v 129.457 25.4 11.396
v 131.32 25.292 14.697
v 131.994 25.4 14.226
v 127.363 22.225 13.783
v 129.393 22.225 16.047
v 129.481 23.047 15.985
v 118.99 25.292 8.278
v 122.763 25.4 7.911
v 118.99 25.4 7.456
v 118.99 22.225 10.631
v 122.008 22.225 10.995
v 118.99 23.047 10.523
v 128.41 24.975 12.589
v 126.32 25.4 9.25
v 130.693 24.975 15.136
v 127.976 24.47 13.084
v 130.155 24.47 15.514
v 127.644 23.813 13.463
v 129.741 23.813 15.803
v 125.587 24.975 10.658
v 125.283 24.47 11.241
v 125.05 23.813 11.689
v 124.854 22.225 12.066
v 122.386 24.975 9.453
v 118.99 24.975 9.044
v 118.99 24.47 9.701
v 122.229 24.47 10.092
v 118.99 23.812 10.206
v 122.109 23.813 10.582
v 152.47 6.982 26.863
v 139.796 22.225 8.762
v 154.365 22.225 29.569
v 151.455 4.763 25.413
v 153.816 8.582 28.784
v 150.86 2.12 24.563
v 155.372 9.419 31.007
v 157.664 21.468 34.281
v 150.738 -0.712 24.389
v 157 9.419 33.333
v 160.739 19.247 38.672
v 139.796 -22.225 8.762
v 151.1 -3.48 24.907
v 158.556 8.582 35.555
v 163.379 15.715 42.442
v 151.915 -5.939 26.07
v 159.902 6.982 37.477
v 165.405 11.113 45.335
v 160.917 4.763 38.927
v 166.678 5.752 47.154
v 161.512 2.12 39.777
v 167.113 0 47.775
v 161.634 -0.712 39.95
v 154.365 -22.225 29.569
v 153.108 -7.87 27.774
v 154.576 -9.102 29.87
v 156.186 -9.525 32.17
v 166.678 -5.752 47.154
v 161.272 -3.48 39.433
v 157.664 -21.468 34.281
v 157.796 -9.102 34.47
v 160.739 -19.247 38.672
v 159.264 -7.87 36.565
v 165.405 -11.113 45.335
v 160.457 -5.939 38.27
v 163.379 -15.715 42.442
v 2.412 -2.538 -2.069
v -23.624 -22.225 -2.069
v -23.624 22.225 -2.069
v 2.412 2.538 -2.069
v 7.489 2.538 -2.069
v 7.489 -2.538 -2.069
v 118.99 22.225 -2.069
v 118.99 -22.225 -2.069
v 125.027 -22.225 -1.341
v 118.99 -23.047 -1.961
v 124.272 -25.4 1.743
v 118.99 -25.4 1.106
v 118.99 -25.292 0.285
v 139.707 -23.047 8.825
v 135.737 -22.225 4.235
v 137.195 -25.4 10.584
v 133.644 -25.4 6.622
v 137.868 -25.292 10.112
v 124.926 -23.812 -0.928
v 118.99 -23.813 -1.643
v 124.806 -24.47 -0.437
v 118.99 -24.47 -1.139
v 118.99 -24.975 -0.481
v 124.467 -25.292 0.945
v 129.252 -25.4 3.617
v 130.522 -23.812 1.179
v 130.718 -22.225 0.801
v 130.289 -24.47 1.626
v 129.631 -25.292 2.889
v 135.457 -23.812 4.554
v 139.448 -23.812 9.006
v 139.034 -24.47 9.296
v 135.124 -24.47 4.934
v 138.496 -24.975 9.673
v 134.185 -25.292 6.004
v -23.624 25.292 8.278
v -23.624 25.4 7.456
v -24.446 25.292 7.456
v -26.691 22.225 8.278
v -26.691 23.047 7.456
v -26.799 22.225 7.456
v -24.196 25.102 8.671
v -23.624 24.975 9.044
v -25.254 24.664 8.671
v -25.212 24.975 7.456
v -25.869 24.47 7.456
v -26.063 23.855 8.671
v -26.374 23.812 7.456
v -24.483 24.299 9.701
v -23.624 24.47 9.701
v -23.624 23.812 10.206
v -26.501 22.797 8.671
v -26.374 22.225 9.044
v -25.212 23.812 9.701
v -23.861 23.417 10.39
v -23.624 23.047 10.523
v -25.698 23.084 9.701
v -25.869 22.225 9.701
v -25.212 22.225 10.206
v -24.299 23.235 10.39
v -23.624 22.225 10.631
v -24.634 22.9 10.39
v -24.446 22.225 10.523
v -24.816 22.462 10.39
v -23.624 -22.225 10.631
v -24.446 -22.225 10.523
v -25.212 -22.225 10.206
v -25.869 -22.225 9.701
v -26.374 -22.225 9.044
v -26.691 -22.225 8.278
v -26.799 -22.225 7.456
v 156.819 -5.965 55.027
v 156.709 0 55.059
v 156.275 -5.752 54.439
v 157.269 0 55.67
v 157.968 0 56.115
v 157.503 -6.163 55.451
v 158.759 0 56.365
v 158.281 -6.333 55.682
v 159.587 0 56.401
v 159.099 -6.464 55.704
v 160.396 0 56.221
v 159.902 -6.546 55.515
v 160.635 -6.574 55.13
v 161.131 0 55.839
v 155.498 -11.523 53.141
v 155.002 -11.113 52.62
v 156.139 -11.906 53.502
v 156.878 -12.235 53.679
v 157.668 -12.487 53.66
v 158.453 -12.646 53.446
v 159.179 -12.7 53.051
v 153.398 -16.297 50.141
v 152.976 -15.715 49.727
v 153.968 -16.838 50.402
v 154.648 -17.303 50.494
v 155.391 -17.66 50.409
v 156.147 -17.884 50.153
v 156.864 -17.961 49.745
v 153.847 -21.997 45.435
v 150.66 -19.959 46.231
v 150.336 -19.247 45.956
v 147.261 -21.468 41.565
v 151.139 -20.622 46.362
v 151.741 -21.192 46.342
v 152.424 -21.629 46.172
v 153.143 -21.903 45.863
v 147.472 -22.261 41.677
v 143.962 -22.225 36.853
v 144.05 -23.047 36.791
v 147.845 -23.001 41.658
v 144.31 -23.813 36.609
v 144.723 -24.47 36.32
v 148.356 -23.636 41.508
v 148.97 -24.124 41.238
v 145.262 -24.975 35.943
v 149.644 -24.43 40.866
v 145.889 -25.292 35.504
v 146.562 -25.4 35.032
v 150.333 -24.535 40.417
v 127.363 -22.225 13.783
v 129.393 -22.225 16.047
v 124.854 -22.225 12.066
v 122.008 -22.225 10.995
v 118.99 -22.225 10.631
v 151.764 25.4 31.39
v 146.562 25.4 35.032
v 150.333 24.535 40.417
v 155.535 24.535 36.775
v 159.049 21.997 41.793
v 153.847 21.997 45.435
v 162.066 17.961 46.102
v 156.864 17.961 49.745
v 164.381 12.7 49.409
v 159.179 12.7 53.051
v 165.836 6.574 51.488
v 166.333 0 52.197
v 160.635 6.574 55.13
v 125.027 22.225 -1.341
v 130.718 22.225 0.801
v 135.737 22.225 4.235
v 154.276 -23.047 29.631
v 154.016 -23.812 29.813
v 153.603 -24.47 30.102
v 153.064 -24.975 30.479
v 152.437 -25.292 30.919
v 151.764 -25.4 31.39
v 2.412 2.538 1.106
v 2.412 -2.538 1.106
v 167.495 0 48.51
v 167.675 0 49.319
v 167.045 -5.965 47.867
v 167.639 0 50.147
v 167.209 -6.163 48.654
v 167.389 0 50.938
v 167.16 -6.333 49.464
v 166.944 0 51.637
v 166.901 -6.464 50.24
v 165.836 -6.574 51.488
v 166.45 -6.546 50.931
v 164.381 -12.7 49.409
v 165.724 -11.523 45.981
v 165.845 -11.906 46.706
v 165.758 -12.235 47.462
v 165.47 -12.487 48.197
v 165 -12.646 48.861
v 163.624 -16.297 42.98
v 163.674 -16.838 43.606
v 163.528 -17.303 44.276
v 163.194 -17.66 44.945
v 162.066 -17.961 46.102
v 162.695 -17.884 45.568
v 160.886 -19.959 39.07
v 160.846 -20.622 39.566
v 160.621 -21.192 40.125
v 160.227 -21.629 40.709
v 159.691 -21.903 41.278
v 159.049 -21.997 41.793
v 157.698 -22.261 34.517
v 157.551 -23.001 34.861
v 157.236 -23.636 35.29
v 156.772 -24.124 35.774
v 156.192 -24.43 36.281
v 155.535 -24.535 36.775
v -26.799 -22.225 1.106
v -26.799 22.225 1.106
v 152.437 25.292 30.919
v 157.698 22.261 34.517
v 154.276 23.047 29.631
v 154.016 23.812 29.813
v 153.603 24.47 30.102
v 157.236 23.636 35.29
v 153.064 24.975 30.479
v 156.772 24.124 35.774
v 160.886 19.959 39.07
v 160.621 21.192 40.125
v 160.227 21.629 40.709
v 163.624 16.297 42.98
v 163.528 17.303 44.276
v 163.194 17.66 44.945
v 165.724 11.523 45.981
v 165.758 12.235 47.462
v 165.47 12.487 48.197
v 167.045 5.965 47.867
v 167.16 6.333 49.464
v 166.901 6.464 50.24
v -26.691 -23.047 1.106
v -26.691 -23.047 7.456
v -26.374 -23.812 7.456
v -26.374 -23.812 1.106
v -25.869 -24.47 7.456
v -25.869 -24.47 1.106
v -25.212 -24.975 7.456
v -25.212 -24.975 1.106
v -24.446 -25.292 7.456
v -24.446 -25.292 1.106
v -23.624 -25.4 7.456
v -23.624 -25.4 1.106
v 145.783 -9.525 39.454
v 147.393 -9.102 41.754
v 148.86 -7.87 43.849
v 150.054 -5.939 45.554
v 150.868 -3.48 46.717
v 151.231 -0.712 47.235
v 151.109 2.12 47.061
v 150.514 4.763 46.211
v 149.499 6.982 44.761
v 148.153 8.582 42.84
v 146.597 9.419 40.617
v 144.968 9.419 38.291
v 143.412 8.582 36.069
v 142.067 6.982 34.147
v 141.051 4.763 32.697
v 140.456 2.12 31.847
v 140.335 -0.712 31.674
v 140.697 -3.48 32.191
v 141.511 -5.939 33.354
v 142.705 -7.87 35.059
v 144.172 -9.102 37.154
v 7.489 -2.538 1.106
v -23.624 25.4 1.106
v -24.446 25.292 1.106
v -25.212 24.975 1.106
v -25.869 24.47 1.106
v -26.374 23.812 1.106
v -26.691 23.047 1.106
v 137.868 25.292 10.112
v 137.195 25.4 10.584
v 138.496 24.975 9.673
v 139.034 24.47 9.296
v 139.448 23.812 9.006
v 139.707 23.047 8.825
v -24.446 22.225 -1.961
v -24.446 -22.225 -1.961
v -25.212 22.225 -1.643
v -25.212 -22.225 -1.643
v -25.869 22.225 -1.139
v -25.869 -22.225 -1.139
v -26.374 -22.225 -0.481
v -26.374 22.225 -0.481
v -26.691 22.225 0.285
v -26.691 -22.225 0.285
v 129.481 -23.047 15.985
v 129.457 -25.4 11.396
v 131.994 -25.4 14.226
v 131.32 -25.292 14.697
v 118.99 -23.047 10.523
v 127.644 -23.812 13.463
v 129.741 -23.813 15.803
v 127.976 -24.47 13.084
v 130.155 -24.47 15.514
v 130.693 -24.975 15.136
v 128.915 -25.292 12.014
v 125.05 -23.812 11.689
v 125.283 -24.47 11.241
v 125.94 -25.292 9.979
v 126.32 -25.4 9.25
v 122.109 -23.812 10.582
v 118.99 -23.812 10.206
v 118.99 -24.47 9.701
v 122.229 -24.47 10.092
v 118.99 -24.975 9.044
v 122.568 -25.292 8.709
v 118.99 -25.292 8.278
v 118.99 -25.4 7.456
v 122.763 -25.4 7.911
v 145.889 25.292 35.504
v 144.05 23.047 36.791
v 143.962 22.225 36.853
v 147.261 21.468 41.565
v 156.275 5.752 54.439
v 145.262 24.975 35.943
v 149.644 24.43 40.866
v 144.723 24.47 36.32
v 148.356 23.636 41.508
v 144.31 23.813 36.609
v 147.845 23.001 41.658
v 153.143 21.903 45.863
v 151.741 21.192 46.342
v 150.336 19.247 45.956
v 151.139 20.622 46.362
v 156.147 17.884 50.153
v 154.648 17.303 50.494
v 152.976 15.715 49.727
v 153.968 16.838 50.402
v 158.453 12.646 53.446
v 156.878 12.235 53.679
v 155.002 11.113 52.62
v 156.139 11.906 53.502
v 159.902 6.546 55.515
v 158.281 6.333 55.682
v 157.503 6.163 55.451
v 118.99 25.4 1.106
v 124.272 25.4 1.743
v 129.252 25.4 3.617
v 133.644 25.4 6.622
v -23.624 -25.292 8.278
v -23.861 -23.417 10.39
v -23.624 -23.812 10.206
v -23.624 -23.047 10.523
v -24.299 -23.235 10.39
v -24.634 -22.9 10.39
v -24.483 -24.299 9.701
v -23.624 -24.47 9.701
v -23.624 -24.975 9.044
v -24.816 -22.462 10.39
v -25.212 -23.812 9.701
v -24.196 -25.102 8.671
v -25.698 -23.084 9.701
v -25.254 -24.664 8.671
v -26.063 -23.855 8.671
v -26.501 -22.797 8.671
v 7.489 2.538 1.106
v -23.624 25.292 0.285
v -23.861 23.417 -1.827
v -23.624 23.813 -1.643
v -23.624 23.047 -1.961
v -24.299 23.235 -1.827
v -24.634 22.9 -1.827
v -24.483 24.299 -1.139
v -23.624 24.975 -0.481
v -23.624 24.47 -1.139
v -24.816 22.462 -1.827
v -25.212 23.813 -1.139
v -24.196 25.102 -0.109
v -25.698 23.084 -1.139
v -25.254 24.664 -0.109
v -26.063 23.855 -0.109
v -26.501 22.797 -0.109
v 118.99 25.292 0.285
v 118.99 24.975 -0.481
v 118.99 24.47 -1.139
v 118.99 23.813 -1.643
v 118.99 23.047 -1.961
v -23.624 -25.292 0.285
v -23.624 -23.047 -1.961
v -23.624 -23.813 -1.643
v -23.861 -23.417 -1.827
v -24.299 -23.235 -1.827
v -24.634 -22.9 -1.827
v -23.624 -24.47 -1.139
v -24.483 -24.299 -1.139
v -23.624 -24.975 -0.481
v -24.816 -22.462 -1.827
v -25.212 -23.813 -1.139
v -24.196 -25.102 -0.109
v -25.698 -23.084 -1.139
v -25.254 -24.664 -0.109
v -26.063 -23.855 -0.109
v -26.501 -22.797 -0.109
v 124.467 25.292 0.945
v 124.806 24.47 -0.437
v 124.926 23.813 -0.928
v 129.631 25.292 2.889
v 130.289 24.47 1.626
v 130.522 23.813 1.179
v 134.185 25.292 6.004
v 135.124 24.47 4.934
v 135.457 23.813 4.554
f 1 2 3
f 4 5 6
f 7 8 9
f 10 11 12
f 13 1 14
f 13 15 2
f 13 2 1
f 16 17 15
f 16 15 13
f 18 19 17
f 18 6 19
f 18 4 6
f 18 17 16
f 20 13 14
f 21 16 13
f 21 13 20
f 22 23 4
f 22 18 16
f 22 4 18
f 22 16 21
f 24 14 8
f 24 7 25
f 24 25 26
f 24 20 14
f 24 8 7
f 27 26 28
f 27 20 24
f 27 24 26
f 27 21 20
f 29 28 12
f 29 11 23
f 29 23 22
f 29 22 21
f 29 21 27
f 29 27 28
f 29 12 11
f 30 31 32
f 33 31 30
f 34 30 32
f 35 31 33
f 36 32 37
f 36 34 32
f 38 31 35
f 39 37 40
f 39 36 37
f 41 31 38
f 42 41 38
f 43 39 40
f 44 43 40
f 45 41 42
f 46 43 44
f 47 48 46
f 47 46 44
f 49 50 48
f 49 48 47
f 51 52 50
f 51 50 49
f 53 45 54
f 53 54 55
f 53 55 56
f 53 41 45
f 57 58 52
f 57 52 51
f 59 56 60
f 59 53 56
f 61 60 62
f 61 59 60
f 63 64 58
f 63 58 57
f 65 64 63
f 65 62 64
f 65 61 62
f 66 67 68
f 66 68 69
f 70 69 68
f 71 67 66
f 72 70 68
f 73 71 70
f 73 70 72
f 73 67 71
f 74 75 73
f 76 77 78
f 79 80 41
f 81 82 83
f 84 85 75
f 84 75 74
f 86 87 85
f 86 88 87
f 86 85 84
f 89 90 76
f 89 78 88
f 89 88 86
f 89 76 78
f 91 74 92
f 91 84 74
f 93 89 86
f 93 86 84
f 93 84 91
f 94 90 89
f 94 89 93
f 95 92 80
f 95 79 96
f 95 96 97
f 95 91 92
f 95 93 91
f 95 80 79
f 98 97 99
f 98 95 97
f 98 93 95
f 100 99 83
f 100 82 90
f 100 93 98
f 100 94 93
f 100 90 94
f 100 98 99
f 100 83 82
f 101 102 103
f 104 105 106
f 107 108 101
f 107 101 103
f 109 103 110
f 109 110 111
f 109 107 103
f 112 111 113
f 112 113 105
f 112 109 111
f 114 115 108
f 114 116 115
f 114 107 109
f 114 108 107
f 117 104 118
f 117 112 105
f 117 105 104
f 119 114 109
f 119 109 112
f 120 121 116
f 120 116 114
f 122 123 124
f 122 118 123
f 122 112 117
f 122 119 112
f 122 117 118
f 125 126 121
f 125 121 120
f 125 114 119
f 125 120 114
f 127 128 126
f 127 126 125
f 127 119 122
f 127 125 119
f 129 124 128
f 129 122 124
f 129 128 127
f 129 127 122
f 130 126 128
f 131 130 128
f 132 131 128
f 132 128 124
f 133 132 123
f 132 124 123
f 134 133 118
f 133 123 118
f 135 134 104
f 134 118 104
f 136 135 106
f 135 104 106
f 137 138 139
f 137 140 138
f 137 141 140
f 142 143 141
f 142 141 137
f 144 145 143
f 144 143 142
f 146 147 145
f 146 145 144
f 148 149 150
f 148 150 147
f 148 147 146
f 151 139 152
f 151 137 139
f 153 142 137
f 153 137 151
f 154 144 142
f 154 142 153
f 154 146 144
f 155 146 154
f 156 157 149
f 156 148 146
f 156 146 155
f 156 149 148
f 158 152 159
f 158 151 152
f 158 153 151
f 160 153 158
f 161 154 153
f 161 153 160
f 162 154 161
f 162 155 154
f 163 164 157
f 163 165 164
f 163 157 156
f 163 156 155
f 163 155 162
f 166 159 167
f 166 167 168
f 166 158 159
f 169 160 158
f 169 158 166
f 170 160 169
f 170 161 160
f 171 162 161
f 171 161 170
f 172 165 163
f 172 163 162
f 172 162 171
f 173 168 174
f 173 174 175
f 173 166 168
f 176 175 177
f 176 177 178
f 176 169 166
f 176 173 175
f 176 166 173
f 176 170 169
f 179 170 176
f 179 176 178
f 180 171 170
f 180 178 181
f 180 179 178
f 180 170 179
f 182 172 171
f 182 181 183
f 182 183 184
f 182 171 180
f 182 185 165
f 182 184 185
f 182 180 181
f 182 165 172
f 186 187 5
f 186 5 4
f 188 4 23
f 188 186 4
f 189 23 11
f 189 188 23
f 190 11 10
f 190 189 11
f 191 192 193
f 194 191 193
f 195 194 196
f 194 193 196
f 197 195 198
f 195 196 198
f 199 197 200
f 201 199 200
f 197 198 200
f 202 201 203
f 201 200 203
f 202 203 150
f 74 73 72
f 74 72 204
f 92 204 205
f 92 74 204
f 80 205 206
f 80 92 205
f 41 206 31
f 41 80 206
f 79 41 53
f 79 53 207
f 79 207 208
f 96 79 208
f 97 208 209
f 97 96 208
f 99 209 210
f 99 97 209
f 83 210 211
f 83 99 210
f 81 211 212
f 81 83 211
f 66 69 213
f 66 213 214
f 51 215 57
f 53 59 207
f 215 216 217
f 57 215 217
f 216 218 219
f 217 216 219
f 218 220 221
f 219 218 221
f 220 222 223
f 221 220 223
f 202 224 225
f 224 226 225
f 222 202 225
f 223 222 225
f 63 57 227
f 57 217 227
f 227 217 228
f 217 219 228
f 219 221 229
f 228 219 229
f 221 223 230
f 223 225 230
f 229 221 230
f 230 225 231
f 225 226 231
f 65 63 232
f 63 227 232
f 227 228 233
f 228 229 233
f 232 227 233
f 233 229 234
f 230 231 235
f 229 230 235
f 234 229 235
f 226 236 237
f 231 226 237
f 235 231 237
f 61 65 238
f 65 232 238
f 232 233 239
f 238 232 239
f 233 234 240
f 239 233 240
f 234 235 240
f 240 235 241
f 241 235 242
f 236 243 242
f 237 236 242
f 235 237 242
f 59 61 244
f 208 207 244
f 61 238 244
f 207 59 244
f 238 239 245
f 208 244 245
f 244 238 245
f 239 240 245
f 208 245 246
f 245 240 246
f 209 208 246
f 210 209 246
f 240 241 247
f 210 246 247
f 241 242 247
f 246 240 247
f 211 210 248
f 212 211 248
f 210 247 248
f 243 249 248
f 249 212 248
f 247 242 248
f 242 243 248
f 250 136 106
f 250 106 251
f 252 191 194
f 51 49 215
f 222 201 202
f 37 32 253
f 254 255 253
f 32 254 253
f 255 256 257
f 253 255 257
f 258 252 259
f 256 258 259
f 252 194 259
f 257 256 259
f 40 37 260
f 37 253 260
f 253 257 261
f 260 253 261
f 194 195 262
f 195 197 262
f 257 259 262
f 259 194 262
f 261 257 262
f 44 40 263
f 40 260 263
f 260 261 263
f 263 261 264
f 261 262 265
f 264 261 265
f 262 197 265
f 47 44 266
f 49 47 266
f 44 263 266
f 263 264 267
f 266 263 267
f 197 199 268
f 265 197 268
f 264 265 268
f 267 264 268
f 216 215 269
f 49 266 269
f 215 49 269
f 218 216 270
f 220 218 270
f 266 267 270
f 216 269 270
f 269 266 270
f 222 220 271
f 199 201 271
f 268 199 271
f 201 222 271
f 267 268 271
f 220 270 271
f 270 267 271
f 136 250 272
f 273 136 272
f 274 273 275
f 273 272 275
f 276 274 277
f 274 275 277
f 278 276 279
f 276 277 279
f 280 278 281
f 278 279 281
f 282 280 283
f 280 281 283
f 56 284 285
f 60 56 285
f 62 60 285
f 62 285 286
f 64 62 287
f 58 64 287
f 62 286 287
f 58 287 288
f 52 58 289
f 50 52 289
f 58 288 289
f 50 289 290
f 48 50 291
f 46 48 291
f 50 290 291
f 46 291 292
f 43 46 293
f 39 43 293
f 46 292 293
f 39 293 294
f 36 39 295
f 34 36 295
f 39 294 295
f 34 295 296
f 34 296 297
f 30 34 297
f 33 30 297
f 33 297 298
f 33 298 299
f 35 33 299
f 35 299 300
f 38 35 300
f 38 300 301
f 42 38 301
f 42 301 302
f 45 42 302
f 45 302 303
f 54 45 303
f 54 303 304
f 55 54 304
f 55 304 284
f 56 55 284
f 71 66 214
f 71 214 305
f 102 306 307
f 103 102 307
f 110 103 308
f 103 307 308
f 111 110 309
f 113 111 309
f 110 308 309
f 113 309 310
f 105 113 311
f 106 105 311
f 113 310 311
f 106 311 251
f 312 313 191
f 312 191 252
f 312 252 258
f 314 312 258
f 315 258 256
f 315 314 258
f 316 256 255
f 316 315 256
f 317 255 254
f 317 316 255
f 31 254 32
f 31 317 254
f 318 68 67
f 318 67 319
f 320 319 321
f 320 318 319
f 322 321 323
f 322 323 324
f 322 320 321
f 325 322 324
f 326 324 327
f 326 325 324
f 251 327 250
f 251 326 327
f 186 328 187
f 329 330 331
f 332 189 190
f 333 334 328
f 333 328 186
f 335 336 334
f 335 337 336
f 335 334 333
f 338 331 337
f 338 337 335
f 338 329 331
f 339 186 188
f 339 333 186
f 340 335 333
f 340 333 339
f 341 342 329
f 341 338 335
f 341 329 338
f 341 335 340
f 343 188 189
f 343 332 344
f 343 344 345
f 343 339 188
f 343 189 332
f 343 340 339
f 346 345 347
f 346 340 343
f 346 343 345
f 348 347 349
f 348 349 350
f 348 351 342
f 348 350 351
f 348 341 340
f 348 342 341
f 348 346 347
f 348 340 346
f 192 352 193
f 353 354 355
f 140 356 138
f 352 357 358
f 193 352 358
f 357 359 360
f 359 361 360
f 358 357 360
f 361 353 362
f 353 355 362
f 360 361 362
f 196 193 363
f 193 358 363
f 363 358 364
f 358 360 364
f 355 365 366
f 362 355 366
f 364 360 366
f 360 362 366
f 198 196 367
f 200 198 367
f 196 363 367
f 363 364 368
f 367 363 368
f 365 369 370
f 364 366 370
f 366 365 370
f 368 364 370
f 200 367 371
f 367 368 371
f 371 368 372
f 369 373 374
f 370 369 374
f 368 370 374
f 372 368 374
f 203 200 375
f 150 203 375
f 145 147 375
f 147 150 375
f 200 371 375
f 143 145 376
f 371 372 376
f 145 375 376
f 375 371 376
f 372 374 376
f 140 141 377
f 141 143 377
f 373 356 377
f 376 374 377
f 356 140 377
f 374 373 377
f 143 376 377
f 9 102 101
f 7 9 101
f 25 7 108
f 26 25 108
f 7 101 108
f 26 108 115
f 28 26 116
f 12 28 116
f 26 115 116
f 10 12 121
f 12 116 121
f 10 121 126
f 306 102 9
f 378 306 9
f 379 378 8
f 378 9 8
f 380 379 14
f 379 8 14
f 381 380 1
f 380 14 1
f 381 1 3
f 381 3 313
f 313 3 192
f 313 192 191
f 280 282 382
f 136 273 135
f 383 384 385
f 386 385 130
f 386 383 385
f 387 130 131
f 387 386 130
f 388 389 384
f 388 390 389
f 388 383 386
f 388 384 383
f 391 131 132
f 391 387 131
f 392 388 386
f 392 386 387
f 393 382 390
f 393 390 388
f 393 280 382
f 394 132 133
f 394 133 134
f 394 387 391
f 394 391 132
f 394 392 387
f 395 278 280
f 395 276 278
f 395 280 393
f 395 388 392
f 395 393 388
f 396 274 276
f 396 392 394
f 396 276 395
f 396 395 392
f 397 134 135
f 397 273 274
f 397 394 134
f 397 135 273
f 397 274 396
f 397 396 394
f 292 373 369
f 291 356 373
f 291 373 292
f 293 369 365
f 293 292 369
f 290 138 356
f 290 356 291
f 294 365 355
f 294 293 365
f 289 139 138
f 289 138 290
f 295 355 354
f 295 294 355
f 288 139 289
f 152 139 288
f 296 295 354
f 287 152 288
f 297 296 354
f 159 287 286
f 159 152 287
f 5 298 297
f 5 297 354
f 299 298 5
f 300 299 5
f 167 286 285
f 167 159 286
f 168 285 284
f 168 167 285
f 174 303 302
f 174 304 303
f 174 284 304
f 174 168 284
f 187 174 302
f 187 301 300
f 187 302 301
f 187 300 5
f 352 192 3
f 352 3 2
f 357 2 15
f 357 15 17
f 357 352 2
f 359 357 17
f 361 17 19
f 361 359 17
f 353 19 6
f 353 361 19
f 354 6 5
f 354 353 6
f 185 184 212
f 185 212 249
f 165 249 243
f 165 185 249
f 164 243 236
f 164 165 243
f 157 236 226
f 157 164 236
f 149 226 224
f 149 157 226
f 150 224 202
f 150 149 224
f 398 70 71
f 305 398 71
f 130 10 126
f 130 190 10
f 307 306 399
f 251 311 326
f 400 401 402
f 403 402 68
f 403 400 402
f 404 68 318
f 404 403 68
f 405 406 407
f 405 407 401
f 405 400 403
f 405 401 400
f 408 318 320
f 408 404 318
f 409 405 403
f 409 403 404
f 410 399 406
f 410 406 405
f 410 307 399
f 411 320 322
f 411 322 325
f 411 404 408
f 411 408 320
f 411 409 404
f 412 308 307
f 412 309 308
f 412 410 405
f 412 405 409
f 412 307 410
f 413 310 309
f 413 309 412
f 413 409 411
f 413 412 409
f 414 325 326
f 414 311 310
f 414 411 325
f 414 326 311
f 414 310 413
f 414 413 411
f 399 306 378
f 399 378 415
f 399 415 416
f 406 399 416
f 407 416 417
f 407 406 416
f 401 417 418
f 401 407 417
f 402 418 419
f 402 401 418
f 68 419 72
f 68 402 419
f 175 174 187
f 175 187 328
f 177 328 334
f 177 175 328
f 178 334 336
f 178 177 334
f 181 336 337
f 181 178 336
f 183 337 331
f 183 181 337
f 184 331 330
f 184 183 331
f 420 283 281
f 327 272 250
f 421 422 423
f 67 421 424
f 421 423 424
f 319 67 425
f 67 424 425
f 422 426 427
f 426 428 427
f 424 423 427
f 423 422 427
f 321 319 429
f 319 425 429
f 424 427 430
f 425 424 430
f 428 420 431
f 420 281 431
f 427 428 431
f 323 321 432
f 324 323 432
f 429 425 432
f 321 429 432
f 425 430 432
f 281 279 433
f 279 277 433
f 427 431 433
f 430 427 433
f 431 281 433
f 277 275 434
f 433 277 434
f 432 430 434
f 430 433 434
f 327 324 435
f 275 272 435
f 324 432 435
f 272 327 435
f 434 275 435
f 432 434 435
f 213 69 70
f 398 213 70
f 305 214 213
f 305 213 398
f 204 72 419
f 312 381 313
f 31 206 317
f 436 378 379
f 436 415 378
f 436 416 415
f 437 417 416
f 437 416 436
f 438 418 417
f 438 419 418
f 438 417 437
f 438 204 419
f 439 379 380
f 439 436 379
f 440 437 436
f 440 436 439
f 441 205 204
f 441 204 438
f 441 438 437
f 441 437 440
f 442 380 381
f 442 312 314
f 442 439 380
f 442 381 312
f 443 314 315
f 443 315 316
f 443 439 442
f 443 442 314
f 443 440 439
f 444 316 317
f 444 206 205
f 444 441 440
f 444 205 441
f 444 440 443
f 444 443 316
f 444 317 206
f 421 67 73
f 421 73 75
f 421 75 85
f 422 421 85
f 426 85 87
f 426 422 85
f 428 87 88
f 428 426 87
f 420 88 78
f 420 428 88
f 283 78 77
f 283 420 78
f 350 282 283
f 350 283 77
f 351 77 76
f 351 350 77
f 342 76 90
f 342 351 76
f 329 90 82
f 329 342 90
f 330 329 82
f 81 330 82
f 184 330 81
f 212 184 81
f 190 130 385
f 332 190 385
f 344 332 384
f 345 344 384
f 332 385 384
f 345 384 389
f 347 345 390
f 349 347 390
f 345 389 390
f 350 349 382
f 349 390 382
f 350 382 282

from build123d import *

# Parameters (mm, degrees)
F1_DEPTH     = 25.4
F2_R         = 9.525
F3_DEPTH     = 42.7816898715
F4_R         = 25.39999
F5_R         = 3.175
F6_W         = 5.0767767243
F6_H         = 5.0767767243
F7_DEPTH     = 3.175
F8_T1_DEPTH  = 142.613798458
F8_T3_DEPTH  = 25.40001
F8_T5_DEPTH  = 44.45
F8_T7_DEPTH  = 25.40001
F8_T9_DEPTH  = 2e-05
F8_T12_ANGLE = 90
F8_T14_ANGLE = 55
F8_T16_ANGLE = 55
F8_T18_ANGLE = 90
F8_T20_ANGLE = 90
F8_T22_ANGLE = 90
F8_T24_ANGLE = 55
F8_T26_ANGLE = 90
F8_T28_ANGLE = 90
F8_T30_ANGLE = 90
F8_T32_ANGLE = 55
F8_T34_ANGLE = 90


# Not quite as in the source:
# - a fillet or chamfer that OpenCascade refuses, or shapes differently, is made with other operations: its cross-section is extruded or revolved along the edge and cut away or added
# - a fillet or chamfer is up to 0.001 mm smaller than in the source, because OpenCascade refuses the exact size


with BuildPart() as f1:
    # F0 (on Front) → F1 (new body, symmetric)
    with BuildSketch(Plane.XZ):
        with BuildLine():
            Line((118.9895820573, 10.6313137069), (-26.7992164007, 10.6313137069))
            Line((-26.7992164007, 10.6313137069), (-26.7992164007, -2.0686862931))
            Line((-26.7992164007, -2.0686862931), (118.9895820573, -2.0686862931))
            ThreePointArc((118.9895820573, -2.0686862931), (130.7179968335, 0.8012385441), (139.7960439822, 8.7624722235))
            Line((139.7960439822, 8.7624722235), (168.9337269489, 50.3753960734))
            Line((168.9337269489, 50.3753960734), (158.5304959864, 57.6598168151))
            Line((158.5304959864, 57.6598168151), (129.3928130198, 16.0468929652))
            ThreePointArc((129.3928130198, 16.0468929652), (124.8537894454, 12.0662761255), (118.9895820573, 10.6313137069))
        make_face()
    extrude(amount=F1_DEPTH, both=True)

    # F2 (on face) → F3 (cut, through all)
    with BuildSketch(Plane(origin=(79.2843072841, 0, -55.515469622), x_dir=(0, -1, 0), z_dir=(-0.8191520443, 0, 0.5735764364))):
        with Locations((0, 115.9365137582)):
            Circle(F2_R)
    extrude(amount=-F3_DEPTH, mode=Mode.SUBTRACT)

    # F4 (radius 25.4 in the source; OpenCascade refuses exactly that, so slightly less here)
    f4_edges = [f1.edges().sort_by_distance(p)[0] for p in [
        (163.732111, 25.4, 54.017606),
        (163.732111, -25.4, 54.017606),
    ]]
    fillet(f4_edges, radius=F4_R)

    # F5
    f5_edges = [f1.edges().sort_by_distance(p)[0] for p in [
        (-26.799216, -25.4, 4.281314),
        (-26.799216, 25.4, 4.281314),
    ]]
    fillet(f5_edges, radius=F5_R)

    # F6 (on face) → F7 (cut)
    with BuildSketch(Plane(origin=(0, 0, -2.0686862931), x_dir=(1, 0, 0), z_dir=(0, 0, -1))):
        with Locations((4.9507835993, 0)):
            Rectangle(F6_W, F6_H)
    extrude(amount=-F7_DEPTH, mode=Mode.SUBTRACT)

    # F8: fillet of radius 3.175 on 24 edges, made by hand

    # F8_s2 → F8_t1 (cut)
    with BuildSketch(Plane.YZ.offset(-23.6242164007)):
        with BuildLine():
            ThreePointArc((25.4, 7.4563137069), (24.4700640303, 9.7013777371), (22.225, 10.6313137069))
            Line((22.225, 10.6313137069), (25.4, 10.6313137069))
            Line((25.4, 10.6313137069), (25.4, 7.4563137069))
        make_face()
        with BuildLine():
            ThreePointArc((-22.225, 10.6313137069), (-24.4700640303, 9.7013777371), (-25.4, 7.4563137069))
            Line((-25.4, 7.4563137069), (-25.4, 10.6313137069))
            Line((-25.4, 10.6313137069), (-22.225, 10.6313137069))
        make_face()
        with BuildLine():
            ThreePointArc((-22.225, -2.0686862931), (-24.4700640303, -1.1387503234), (-25.4, 1.1063137069))
            Line((-25.4, 1.1063137069), (-25.4, -2.0686862931))
            Line((-25.4, -2.0686862931), (-22.225, -2.0686862931))
        make_face()
        with BuildLine():
            ThreePointArc((25.4, 1.1063137069), (24.4700640303, -1.1387503234), (22.225, -2.0686862931))
            Line((22.225, -2.0686862931), (25.4, -2.0686862931))
            Line((25.4, -2.0686862931), (25.4, 1.1063137069))
        make_face()
    extrude(amount=F8_T1_DEPTH, mode=Mode.SUBTRACT)

    # F8_s4 → F8_t3 (cut)
    with BuildSketch(Plane(origin=(64.6773529548, 0, 92.3688327037), x_dir=(0, 1, 0), z_dir=(-0.5735764364, 0, -0.8191520443))):
        with BuildLine():
            ThreePointArc((25.4, 99.96326762), (24.4700640303, 97.7182035897), (22.225, 96.78826762))
            Line((22.225, 96.78826762), (25.4, 96.78826762))
            Line((25.4, 96.78826762), (25.4, 99.96326762))
        make_face()
        with BuildLine():
            ThreePointArc((-22.225, 96.78826762), (-24.4700640303, 97.7182035897), (-25.4, 99.96326762))
            Line((-25.4, 99.96326762), (-25.4, 96.78826762))
            Line((-25.4, 96.78826762), (-22.225, 96.78826762))
        make_face()
    extrude(amount=F8_T3_DEPTH, mode=Mode.SUBTRACT)

    # F8_s6 → F8_t5 (cut)
    with BuildSketch(Plane.XZ.offset(-22.225)):
        with BuildLine():
            ThreePointArc((-23.6242164007, 10.6313137069), (-25.869280431, 9.7013777371), (-26.7992164007, 7.4563137069))
            Line((-26.7992164007, 7.4563137069), (-26.7992164007, 10.6313137069))
            Line((-26.7992164007, 10.6313137069), (-23.6242164007, 10.6313137069))
        make_face()
        with BuildLine():
            ThreePointArc((-23.6242164007, -2.0686862931), (-25.869280431, -1.1387503234), (-26.7992164007, 1.1063137069))
            Line((-26.7992164007, 1.1063137069), (-26.7992164007, -2.0686862931))
            Line((-26.7992164007, -2.0686862931), (-23.6242164007, -2.0686862931))
        make_face()
    extrude(amount=F8_T5_DEPTH, mode=Mode.SUBTRACT)

    # F8_s8 → F8_t7 (cut)
    with BuildSketch(Plane(origin=(50.1085057357, 0, 71.5623625873), x_dir=(0, 1, 0), z_dir=(0.5735764364, 0, 0.8191520443))):
        with BuildLine():
            ThreePointArc((25.4, -106.31326762), (24.4700640303, -108.5583316502), (22.225, -109.48826762))
            Line((22.225, -109.48826762), (25.4, -109.48826762))
            Line((25.4, -109.48826762), (25.4, -106.31326762))
        make_face()
        with BuildLine():
            ThreePointArc((-22.225, -109.48826762), (-24.4700640303, -108.5583316502), (-25.4, -106.31326762))
            Line((-25.4, -106.31326762), (-25.4, -109.48826762))
            Line((-25.4, -109.48826762), (-22.225, -109.48826762))
        make_face()
    extrude(amount=F8_T7_DEPTH, mode=Mode.SUBTRACT)

    # F8_s10 → F8_t9 (cut)
    with BuildSketch(Plane.XZ.offset(-1e-05)):
        with BuildLine():
            ThreePointArc((167.1126217635, 47.7745883328), (167.6385786386, 50.1470264823), (166.3329192083, 52.1965012588))
            Line((166.3329192083, 52.1965012588), (168.9337269489, 50.3753960734))
            Line((168.9337269489, 50.3753960734), (167.1126217635, 47.7745883328))
        make_face()
        with BuildLine():
            ThreePointArc((156.709390801, 55.0590090745), (158.7588655775, 56.3646685049), (161.131303727, 55.8387116297))
            Line((161.131303727, 55.8387116297), (158.5304959864, 57.6598168151))
            Line((158.5304959864, 57.6598168151), (156.709390801, 55.0590090745))
        make_face()
    extrude(amount=F8_T9_DEPTH, mode=Mode.SUBTRACT)

    # F8_s11 → F8_t12 (revolve, cut)
    with BuildSketch(Plane(origin=(64.6773529548, 0, 92.3688327037), x_dir=(0, 1, 0), z_dir=(-0.5735764364, 0, -0.8191520443))):
        with BuildLine():
            ThreePointArc((25.4, 99.96326762), (24.4700640303, 97.7182035897), (22.225, 96.78826762))
            Line((22.225, 96.78826762), (25.4, 96.78826762))
            Line((25.4, 96.78826762), (25.4, 99.96326762))
        make_face()
    revolve(axis=Axis((143.9616602388, 1e-05, 36.8533630817), (0.8191520443, 0, -0.5735764364)), revolution_arc=F8_T12_ANGLE, mode=Mode.SUBTRACT)

    # F8_s13 → F8_t14 (revolve, cut)
    with BuildSketch(Plane.YZ.offset(118.9895820573)):
        with BuildLine():
            ThreePointArc((25.4, 1.1063137069), (24.4700640303, -1.1387503234), (22.225, -2.0686862931))
            Line((22.225, -2.0686862931), (25.4, -2.0686862931))
            Line((25.4, -2.0686862931), (25.4, 1.1063137069))
        make_face()
    revolve(axis=Axis((118.9895820573, 25.4, 23.3313137069), (0, -1, 0)), revolution_arc=F8_T14_ANGLE, mode=Mode.SUBTRACT)

    # F8_s15 → F8_t16 (revolve, cut)
    with BuildSketch(Plane(origin=(50.1085057357, 0, 71.5623625873), x_dir=(0, 1, 0), z_dir=(0.5735764364, 0, 0.8191520443))):
        with BuildLine():
            ThreePointArc((25.4, -99.96326762), (24.4700640303, -97.7182035897), (22.225, -96.78826762))
            Line((22.225, -96.78826762), (25.4, -96.78826762))
            Line((25.4, -96.78826762), (25.4, -99.96326762))
        make_face()
    revolve(axis=Axis((118.9895820573, 25.4, 23.3313137069), (0, 1, 0)), revolution_arc=F8_T16_ANGLE, mode=Mode.SUBTRACT)

    # F8_s17 → F8_t18 (revolve, cut)
    with BuildSketch(Plane.YZ.offset(-23.6242164007)):
        with BuildLine():
            ThreePointArc((22.225, -2.0686862931), (24.4700640303, -1.1387503234), (25.4, 1.1063137069))
            Line((25.4, 1.1063137069), (25.4, -2.0686862931))
            Line((25.4, -2.0686862931), (22.225, -2.0686862931))
        make_face()
    revolve(axis=Axis((-23.6242164007, 22.225, -2.0686862931), (0, 0, 1)), revolution_arc=F8_T18_ANGLE, mode=Mode.SUBTRACT)

    # F8_s19 → F8_t20 (revolve, cut)
    with BuildSketch(Plane.YZ.offset(-23.6242164007)):
        with BuildLine():
            ThreePointArc((-22.225, -2.0686862931), (-24.4700640303, -1.1387503234), (-25.4, 1.1063137069))
            Line((-25.4, 1.1063137069), (-25.4, -2.0686862931))
            Line((-25.4, -2.0686862931), (-22.225, -2.0686862931))
        make_face()
    revolve(axis=Axis((-23.6242164007, -22.225, -2.0686862931), (0, 0, -1)), revolution_arc=F8_T20_ANGLE, mode=Mode.SUBTRACT)

    # F8_s21 → F8_t22 (revolve, cut)
    with BuildSketch(Plane.YZ.offset(-23.6242164007)):
        with BuildLine():
            ThreePointArc((25.4, 7.4563137069), (24.4700640303, 9.7013777371), (22.225, 10.6313137069))
            Line((22.225, 10.6313137069), (25.4, 10.6313137069))
            Line((25.4, 10.6313137069), (25.4, 7.4563137069))
        make_face()
    revolve(axis=Axis((-23.6242164007, 22.225, 10.6313137069), (0, 0, 1)), revolution_arc=F8_T22_ANGLE, mode=Mode.SUBTRACT)

    # F8_s23 → F8_t24 (revolve, cut)
    with BuildSketch(Plane.YZ.offset(118.9895820573)):
        with BuildLine():
            ThreePointArc((-22.225, -2.0686862931), (-24.4700640303, -1.1387503234), (-25.4, 1.1063137069))
            Line((-25.4, 1.1063137069), (-25.4, -2.0686862931))
            Line((-25.4, -2.0686862931), (-22.225, -2.0686862931))
        make_face()
    revolve(axis=Axis((118.9895820573, -25.4, 23.3313137069), (0, -1, 0)), revolution_arc=F8_T24_ANGLE, mode=Mode.SUBTRACT)

    # F8_s25 → F8_t26 (revolve, cut)
    with BuildSketch(Plane.YZ.offset(-23.6242164007)):
        with BuildLine():
            ThreePointArc((-22.225, 10.6313137069), (-24.4700640303, 9.7013777371), (-25.4, 7.4563137069))
            Line((-25.4, 7.4563137069), (-25.4, 10.6313137069))
            Line((-25.4, 10.6313137069), (-22.225, 10.6313137069))
        make_face()
    revolve(axis=Axis((-23.6242164007, -22.225, 10.6313137069), (0, 0, -1)), revolution_arc=F8_T26_ANGLE, mode=Mode.SUBTRACT)

    # F8_s27 → F8_t28 (revolve, cut)
    with BuildSketch(Plane(origin=(64.6773529548, 0, 92.3688327037), x_dir=(0, 1, 0), z_dir=(-0.5735764364, 0, -0.8191520443))):
        with BuildLine():
            ThreePointArc((22.225, 109.48826762), (24.4700640303, 108.5583316502), (25.4, 106.31326762))
            Line((25.4, 106.31326762), (25.4, 109.48826762))
            Line((25.4, 109.48826762), (22.225, 109.48826762))
        make_face()
    revolve(axis=Axis((154.3648912013, 1e-05, 29.56894234), (0.8191520443, 0, -0.5735764364)), revolution_arc=F8_T28_ANGLE, mode=Mode.SUBTRACT)

    # F8_s29 → F8_t30 (revolve, cut)
    with BuildSketch(Plane.XZ.offset(1e-05)):
        with BuildLine():
            ThreePointArc((167.1126217635, 47.7745883328), (167.6385786386, 50.1470264823), (166.3329192083, 52.1965012588))
            Line((166.3329192083, 52.1965012588), (168.9337269489, 50.3753960734))
            Line((168.9337269489, 50.3753960734), (167.1126217635, 47.7745883328))
        make_face()
    revolve(axis=Axis((154.3648912013, -1e-05, 29.56894234), (0.8191520443, 0, -0.5735764364)), revolution_arc=F8_T30_ANGLE, mode=Mode.SUBTRACT)

    # F8_s31 → F8_t32 (revolve, cut)
    with BuildSketch(Plane(origin=(50.1085057357, 0, 71.5623625873), x_dir=(0, 1, 0), z_dir=(0.5735764364, 0, 0.8191520443))):
        with BuildLine():
            ThreePointArc((-22.225, -96.78826762), (-24.4700640303, -97.7182035897), (-25.4, -99.96326762))
            Line((-25.4, -99.96326762), (-25.4, -96.78826762))
            Line((-25.4, -96.78826762), (-22.225, -96.78826762))
        make_face()
    revolve(axis=Axis((118.9895820573, -25.4, 23.3313137069), (0, 1, 0)), revolution_arc=F8_T32_ANGLE, mode=Mode.SUBTRACT)

    # F8_s33 → F8_t34 (revolve, cut)
    with BuildSketch(Plane.XZ.offset(1e-05)):
        with BuildLine():
            ThreePointArc((156.709390801, 55.0590090745), (158.7588655775, 56.3646685049), (161.131303727, 55.8387116297))
            Line((161.131303727, 55.8387116297), (158.5304959864, 57.6598168151))
            Line((158.5304959864, 57.6598168151), (156.709390801, 55.0590090745))
        make_face()
    revolve(axis=Axis((143.9616602388, -1e-05, 36.8533630817), (0.8191520443, 0, -0.5735764364)), revolution_arc=F8_T34_ANGLE, mode=Mode.SUBTRACT)


solid = f1.part
